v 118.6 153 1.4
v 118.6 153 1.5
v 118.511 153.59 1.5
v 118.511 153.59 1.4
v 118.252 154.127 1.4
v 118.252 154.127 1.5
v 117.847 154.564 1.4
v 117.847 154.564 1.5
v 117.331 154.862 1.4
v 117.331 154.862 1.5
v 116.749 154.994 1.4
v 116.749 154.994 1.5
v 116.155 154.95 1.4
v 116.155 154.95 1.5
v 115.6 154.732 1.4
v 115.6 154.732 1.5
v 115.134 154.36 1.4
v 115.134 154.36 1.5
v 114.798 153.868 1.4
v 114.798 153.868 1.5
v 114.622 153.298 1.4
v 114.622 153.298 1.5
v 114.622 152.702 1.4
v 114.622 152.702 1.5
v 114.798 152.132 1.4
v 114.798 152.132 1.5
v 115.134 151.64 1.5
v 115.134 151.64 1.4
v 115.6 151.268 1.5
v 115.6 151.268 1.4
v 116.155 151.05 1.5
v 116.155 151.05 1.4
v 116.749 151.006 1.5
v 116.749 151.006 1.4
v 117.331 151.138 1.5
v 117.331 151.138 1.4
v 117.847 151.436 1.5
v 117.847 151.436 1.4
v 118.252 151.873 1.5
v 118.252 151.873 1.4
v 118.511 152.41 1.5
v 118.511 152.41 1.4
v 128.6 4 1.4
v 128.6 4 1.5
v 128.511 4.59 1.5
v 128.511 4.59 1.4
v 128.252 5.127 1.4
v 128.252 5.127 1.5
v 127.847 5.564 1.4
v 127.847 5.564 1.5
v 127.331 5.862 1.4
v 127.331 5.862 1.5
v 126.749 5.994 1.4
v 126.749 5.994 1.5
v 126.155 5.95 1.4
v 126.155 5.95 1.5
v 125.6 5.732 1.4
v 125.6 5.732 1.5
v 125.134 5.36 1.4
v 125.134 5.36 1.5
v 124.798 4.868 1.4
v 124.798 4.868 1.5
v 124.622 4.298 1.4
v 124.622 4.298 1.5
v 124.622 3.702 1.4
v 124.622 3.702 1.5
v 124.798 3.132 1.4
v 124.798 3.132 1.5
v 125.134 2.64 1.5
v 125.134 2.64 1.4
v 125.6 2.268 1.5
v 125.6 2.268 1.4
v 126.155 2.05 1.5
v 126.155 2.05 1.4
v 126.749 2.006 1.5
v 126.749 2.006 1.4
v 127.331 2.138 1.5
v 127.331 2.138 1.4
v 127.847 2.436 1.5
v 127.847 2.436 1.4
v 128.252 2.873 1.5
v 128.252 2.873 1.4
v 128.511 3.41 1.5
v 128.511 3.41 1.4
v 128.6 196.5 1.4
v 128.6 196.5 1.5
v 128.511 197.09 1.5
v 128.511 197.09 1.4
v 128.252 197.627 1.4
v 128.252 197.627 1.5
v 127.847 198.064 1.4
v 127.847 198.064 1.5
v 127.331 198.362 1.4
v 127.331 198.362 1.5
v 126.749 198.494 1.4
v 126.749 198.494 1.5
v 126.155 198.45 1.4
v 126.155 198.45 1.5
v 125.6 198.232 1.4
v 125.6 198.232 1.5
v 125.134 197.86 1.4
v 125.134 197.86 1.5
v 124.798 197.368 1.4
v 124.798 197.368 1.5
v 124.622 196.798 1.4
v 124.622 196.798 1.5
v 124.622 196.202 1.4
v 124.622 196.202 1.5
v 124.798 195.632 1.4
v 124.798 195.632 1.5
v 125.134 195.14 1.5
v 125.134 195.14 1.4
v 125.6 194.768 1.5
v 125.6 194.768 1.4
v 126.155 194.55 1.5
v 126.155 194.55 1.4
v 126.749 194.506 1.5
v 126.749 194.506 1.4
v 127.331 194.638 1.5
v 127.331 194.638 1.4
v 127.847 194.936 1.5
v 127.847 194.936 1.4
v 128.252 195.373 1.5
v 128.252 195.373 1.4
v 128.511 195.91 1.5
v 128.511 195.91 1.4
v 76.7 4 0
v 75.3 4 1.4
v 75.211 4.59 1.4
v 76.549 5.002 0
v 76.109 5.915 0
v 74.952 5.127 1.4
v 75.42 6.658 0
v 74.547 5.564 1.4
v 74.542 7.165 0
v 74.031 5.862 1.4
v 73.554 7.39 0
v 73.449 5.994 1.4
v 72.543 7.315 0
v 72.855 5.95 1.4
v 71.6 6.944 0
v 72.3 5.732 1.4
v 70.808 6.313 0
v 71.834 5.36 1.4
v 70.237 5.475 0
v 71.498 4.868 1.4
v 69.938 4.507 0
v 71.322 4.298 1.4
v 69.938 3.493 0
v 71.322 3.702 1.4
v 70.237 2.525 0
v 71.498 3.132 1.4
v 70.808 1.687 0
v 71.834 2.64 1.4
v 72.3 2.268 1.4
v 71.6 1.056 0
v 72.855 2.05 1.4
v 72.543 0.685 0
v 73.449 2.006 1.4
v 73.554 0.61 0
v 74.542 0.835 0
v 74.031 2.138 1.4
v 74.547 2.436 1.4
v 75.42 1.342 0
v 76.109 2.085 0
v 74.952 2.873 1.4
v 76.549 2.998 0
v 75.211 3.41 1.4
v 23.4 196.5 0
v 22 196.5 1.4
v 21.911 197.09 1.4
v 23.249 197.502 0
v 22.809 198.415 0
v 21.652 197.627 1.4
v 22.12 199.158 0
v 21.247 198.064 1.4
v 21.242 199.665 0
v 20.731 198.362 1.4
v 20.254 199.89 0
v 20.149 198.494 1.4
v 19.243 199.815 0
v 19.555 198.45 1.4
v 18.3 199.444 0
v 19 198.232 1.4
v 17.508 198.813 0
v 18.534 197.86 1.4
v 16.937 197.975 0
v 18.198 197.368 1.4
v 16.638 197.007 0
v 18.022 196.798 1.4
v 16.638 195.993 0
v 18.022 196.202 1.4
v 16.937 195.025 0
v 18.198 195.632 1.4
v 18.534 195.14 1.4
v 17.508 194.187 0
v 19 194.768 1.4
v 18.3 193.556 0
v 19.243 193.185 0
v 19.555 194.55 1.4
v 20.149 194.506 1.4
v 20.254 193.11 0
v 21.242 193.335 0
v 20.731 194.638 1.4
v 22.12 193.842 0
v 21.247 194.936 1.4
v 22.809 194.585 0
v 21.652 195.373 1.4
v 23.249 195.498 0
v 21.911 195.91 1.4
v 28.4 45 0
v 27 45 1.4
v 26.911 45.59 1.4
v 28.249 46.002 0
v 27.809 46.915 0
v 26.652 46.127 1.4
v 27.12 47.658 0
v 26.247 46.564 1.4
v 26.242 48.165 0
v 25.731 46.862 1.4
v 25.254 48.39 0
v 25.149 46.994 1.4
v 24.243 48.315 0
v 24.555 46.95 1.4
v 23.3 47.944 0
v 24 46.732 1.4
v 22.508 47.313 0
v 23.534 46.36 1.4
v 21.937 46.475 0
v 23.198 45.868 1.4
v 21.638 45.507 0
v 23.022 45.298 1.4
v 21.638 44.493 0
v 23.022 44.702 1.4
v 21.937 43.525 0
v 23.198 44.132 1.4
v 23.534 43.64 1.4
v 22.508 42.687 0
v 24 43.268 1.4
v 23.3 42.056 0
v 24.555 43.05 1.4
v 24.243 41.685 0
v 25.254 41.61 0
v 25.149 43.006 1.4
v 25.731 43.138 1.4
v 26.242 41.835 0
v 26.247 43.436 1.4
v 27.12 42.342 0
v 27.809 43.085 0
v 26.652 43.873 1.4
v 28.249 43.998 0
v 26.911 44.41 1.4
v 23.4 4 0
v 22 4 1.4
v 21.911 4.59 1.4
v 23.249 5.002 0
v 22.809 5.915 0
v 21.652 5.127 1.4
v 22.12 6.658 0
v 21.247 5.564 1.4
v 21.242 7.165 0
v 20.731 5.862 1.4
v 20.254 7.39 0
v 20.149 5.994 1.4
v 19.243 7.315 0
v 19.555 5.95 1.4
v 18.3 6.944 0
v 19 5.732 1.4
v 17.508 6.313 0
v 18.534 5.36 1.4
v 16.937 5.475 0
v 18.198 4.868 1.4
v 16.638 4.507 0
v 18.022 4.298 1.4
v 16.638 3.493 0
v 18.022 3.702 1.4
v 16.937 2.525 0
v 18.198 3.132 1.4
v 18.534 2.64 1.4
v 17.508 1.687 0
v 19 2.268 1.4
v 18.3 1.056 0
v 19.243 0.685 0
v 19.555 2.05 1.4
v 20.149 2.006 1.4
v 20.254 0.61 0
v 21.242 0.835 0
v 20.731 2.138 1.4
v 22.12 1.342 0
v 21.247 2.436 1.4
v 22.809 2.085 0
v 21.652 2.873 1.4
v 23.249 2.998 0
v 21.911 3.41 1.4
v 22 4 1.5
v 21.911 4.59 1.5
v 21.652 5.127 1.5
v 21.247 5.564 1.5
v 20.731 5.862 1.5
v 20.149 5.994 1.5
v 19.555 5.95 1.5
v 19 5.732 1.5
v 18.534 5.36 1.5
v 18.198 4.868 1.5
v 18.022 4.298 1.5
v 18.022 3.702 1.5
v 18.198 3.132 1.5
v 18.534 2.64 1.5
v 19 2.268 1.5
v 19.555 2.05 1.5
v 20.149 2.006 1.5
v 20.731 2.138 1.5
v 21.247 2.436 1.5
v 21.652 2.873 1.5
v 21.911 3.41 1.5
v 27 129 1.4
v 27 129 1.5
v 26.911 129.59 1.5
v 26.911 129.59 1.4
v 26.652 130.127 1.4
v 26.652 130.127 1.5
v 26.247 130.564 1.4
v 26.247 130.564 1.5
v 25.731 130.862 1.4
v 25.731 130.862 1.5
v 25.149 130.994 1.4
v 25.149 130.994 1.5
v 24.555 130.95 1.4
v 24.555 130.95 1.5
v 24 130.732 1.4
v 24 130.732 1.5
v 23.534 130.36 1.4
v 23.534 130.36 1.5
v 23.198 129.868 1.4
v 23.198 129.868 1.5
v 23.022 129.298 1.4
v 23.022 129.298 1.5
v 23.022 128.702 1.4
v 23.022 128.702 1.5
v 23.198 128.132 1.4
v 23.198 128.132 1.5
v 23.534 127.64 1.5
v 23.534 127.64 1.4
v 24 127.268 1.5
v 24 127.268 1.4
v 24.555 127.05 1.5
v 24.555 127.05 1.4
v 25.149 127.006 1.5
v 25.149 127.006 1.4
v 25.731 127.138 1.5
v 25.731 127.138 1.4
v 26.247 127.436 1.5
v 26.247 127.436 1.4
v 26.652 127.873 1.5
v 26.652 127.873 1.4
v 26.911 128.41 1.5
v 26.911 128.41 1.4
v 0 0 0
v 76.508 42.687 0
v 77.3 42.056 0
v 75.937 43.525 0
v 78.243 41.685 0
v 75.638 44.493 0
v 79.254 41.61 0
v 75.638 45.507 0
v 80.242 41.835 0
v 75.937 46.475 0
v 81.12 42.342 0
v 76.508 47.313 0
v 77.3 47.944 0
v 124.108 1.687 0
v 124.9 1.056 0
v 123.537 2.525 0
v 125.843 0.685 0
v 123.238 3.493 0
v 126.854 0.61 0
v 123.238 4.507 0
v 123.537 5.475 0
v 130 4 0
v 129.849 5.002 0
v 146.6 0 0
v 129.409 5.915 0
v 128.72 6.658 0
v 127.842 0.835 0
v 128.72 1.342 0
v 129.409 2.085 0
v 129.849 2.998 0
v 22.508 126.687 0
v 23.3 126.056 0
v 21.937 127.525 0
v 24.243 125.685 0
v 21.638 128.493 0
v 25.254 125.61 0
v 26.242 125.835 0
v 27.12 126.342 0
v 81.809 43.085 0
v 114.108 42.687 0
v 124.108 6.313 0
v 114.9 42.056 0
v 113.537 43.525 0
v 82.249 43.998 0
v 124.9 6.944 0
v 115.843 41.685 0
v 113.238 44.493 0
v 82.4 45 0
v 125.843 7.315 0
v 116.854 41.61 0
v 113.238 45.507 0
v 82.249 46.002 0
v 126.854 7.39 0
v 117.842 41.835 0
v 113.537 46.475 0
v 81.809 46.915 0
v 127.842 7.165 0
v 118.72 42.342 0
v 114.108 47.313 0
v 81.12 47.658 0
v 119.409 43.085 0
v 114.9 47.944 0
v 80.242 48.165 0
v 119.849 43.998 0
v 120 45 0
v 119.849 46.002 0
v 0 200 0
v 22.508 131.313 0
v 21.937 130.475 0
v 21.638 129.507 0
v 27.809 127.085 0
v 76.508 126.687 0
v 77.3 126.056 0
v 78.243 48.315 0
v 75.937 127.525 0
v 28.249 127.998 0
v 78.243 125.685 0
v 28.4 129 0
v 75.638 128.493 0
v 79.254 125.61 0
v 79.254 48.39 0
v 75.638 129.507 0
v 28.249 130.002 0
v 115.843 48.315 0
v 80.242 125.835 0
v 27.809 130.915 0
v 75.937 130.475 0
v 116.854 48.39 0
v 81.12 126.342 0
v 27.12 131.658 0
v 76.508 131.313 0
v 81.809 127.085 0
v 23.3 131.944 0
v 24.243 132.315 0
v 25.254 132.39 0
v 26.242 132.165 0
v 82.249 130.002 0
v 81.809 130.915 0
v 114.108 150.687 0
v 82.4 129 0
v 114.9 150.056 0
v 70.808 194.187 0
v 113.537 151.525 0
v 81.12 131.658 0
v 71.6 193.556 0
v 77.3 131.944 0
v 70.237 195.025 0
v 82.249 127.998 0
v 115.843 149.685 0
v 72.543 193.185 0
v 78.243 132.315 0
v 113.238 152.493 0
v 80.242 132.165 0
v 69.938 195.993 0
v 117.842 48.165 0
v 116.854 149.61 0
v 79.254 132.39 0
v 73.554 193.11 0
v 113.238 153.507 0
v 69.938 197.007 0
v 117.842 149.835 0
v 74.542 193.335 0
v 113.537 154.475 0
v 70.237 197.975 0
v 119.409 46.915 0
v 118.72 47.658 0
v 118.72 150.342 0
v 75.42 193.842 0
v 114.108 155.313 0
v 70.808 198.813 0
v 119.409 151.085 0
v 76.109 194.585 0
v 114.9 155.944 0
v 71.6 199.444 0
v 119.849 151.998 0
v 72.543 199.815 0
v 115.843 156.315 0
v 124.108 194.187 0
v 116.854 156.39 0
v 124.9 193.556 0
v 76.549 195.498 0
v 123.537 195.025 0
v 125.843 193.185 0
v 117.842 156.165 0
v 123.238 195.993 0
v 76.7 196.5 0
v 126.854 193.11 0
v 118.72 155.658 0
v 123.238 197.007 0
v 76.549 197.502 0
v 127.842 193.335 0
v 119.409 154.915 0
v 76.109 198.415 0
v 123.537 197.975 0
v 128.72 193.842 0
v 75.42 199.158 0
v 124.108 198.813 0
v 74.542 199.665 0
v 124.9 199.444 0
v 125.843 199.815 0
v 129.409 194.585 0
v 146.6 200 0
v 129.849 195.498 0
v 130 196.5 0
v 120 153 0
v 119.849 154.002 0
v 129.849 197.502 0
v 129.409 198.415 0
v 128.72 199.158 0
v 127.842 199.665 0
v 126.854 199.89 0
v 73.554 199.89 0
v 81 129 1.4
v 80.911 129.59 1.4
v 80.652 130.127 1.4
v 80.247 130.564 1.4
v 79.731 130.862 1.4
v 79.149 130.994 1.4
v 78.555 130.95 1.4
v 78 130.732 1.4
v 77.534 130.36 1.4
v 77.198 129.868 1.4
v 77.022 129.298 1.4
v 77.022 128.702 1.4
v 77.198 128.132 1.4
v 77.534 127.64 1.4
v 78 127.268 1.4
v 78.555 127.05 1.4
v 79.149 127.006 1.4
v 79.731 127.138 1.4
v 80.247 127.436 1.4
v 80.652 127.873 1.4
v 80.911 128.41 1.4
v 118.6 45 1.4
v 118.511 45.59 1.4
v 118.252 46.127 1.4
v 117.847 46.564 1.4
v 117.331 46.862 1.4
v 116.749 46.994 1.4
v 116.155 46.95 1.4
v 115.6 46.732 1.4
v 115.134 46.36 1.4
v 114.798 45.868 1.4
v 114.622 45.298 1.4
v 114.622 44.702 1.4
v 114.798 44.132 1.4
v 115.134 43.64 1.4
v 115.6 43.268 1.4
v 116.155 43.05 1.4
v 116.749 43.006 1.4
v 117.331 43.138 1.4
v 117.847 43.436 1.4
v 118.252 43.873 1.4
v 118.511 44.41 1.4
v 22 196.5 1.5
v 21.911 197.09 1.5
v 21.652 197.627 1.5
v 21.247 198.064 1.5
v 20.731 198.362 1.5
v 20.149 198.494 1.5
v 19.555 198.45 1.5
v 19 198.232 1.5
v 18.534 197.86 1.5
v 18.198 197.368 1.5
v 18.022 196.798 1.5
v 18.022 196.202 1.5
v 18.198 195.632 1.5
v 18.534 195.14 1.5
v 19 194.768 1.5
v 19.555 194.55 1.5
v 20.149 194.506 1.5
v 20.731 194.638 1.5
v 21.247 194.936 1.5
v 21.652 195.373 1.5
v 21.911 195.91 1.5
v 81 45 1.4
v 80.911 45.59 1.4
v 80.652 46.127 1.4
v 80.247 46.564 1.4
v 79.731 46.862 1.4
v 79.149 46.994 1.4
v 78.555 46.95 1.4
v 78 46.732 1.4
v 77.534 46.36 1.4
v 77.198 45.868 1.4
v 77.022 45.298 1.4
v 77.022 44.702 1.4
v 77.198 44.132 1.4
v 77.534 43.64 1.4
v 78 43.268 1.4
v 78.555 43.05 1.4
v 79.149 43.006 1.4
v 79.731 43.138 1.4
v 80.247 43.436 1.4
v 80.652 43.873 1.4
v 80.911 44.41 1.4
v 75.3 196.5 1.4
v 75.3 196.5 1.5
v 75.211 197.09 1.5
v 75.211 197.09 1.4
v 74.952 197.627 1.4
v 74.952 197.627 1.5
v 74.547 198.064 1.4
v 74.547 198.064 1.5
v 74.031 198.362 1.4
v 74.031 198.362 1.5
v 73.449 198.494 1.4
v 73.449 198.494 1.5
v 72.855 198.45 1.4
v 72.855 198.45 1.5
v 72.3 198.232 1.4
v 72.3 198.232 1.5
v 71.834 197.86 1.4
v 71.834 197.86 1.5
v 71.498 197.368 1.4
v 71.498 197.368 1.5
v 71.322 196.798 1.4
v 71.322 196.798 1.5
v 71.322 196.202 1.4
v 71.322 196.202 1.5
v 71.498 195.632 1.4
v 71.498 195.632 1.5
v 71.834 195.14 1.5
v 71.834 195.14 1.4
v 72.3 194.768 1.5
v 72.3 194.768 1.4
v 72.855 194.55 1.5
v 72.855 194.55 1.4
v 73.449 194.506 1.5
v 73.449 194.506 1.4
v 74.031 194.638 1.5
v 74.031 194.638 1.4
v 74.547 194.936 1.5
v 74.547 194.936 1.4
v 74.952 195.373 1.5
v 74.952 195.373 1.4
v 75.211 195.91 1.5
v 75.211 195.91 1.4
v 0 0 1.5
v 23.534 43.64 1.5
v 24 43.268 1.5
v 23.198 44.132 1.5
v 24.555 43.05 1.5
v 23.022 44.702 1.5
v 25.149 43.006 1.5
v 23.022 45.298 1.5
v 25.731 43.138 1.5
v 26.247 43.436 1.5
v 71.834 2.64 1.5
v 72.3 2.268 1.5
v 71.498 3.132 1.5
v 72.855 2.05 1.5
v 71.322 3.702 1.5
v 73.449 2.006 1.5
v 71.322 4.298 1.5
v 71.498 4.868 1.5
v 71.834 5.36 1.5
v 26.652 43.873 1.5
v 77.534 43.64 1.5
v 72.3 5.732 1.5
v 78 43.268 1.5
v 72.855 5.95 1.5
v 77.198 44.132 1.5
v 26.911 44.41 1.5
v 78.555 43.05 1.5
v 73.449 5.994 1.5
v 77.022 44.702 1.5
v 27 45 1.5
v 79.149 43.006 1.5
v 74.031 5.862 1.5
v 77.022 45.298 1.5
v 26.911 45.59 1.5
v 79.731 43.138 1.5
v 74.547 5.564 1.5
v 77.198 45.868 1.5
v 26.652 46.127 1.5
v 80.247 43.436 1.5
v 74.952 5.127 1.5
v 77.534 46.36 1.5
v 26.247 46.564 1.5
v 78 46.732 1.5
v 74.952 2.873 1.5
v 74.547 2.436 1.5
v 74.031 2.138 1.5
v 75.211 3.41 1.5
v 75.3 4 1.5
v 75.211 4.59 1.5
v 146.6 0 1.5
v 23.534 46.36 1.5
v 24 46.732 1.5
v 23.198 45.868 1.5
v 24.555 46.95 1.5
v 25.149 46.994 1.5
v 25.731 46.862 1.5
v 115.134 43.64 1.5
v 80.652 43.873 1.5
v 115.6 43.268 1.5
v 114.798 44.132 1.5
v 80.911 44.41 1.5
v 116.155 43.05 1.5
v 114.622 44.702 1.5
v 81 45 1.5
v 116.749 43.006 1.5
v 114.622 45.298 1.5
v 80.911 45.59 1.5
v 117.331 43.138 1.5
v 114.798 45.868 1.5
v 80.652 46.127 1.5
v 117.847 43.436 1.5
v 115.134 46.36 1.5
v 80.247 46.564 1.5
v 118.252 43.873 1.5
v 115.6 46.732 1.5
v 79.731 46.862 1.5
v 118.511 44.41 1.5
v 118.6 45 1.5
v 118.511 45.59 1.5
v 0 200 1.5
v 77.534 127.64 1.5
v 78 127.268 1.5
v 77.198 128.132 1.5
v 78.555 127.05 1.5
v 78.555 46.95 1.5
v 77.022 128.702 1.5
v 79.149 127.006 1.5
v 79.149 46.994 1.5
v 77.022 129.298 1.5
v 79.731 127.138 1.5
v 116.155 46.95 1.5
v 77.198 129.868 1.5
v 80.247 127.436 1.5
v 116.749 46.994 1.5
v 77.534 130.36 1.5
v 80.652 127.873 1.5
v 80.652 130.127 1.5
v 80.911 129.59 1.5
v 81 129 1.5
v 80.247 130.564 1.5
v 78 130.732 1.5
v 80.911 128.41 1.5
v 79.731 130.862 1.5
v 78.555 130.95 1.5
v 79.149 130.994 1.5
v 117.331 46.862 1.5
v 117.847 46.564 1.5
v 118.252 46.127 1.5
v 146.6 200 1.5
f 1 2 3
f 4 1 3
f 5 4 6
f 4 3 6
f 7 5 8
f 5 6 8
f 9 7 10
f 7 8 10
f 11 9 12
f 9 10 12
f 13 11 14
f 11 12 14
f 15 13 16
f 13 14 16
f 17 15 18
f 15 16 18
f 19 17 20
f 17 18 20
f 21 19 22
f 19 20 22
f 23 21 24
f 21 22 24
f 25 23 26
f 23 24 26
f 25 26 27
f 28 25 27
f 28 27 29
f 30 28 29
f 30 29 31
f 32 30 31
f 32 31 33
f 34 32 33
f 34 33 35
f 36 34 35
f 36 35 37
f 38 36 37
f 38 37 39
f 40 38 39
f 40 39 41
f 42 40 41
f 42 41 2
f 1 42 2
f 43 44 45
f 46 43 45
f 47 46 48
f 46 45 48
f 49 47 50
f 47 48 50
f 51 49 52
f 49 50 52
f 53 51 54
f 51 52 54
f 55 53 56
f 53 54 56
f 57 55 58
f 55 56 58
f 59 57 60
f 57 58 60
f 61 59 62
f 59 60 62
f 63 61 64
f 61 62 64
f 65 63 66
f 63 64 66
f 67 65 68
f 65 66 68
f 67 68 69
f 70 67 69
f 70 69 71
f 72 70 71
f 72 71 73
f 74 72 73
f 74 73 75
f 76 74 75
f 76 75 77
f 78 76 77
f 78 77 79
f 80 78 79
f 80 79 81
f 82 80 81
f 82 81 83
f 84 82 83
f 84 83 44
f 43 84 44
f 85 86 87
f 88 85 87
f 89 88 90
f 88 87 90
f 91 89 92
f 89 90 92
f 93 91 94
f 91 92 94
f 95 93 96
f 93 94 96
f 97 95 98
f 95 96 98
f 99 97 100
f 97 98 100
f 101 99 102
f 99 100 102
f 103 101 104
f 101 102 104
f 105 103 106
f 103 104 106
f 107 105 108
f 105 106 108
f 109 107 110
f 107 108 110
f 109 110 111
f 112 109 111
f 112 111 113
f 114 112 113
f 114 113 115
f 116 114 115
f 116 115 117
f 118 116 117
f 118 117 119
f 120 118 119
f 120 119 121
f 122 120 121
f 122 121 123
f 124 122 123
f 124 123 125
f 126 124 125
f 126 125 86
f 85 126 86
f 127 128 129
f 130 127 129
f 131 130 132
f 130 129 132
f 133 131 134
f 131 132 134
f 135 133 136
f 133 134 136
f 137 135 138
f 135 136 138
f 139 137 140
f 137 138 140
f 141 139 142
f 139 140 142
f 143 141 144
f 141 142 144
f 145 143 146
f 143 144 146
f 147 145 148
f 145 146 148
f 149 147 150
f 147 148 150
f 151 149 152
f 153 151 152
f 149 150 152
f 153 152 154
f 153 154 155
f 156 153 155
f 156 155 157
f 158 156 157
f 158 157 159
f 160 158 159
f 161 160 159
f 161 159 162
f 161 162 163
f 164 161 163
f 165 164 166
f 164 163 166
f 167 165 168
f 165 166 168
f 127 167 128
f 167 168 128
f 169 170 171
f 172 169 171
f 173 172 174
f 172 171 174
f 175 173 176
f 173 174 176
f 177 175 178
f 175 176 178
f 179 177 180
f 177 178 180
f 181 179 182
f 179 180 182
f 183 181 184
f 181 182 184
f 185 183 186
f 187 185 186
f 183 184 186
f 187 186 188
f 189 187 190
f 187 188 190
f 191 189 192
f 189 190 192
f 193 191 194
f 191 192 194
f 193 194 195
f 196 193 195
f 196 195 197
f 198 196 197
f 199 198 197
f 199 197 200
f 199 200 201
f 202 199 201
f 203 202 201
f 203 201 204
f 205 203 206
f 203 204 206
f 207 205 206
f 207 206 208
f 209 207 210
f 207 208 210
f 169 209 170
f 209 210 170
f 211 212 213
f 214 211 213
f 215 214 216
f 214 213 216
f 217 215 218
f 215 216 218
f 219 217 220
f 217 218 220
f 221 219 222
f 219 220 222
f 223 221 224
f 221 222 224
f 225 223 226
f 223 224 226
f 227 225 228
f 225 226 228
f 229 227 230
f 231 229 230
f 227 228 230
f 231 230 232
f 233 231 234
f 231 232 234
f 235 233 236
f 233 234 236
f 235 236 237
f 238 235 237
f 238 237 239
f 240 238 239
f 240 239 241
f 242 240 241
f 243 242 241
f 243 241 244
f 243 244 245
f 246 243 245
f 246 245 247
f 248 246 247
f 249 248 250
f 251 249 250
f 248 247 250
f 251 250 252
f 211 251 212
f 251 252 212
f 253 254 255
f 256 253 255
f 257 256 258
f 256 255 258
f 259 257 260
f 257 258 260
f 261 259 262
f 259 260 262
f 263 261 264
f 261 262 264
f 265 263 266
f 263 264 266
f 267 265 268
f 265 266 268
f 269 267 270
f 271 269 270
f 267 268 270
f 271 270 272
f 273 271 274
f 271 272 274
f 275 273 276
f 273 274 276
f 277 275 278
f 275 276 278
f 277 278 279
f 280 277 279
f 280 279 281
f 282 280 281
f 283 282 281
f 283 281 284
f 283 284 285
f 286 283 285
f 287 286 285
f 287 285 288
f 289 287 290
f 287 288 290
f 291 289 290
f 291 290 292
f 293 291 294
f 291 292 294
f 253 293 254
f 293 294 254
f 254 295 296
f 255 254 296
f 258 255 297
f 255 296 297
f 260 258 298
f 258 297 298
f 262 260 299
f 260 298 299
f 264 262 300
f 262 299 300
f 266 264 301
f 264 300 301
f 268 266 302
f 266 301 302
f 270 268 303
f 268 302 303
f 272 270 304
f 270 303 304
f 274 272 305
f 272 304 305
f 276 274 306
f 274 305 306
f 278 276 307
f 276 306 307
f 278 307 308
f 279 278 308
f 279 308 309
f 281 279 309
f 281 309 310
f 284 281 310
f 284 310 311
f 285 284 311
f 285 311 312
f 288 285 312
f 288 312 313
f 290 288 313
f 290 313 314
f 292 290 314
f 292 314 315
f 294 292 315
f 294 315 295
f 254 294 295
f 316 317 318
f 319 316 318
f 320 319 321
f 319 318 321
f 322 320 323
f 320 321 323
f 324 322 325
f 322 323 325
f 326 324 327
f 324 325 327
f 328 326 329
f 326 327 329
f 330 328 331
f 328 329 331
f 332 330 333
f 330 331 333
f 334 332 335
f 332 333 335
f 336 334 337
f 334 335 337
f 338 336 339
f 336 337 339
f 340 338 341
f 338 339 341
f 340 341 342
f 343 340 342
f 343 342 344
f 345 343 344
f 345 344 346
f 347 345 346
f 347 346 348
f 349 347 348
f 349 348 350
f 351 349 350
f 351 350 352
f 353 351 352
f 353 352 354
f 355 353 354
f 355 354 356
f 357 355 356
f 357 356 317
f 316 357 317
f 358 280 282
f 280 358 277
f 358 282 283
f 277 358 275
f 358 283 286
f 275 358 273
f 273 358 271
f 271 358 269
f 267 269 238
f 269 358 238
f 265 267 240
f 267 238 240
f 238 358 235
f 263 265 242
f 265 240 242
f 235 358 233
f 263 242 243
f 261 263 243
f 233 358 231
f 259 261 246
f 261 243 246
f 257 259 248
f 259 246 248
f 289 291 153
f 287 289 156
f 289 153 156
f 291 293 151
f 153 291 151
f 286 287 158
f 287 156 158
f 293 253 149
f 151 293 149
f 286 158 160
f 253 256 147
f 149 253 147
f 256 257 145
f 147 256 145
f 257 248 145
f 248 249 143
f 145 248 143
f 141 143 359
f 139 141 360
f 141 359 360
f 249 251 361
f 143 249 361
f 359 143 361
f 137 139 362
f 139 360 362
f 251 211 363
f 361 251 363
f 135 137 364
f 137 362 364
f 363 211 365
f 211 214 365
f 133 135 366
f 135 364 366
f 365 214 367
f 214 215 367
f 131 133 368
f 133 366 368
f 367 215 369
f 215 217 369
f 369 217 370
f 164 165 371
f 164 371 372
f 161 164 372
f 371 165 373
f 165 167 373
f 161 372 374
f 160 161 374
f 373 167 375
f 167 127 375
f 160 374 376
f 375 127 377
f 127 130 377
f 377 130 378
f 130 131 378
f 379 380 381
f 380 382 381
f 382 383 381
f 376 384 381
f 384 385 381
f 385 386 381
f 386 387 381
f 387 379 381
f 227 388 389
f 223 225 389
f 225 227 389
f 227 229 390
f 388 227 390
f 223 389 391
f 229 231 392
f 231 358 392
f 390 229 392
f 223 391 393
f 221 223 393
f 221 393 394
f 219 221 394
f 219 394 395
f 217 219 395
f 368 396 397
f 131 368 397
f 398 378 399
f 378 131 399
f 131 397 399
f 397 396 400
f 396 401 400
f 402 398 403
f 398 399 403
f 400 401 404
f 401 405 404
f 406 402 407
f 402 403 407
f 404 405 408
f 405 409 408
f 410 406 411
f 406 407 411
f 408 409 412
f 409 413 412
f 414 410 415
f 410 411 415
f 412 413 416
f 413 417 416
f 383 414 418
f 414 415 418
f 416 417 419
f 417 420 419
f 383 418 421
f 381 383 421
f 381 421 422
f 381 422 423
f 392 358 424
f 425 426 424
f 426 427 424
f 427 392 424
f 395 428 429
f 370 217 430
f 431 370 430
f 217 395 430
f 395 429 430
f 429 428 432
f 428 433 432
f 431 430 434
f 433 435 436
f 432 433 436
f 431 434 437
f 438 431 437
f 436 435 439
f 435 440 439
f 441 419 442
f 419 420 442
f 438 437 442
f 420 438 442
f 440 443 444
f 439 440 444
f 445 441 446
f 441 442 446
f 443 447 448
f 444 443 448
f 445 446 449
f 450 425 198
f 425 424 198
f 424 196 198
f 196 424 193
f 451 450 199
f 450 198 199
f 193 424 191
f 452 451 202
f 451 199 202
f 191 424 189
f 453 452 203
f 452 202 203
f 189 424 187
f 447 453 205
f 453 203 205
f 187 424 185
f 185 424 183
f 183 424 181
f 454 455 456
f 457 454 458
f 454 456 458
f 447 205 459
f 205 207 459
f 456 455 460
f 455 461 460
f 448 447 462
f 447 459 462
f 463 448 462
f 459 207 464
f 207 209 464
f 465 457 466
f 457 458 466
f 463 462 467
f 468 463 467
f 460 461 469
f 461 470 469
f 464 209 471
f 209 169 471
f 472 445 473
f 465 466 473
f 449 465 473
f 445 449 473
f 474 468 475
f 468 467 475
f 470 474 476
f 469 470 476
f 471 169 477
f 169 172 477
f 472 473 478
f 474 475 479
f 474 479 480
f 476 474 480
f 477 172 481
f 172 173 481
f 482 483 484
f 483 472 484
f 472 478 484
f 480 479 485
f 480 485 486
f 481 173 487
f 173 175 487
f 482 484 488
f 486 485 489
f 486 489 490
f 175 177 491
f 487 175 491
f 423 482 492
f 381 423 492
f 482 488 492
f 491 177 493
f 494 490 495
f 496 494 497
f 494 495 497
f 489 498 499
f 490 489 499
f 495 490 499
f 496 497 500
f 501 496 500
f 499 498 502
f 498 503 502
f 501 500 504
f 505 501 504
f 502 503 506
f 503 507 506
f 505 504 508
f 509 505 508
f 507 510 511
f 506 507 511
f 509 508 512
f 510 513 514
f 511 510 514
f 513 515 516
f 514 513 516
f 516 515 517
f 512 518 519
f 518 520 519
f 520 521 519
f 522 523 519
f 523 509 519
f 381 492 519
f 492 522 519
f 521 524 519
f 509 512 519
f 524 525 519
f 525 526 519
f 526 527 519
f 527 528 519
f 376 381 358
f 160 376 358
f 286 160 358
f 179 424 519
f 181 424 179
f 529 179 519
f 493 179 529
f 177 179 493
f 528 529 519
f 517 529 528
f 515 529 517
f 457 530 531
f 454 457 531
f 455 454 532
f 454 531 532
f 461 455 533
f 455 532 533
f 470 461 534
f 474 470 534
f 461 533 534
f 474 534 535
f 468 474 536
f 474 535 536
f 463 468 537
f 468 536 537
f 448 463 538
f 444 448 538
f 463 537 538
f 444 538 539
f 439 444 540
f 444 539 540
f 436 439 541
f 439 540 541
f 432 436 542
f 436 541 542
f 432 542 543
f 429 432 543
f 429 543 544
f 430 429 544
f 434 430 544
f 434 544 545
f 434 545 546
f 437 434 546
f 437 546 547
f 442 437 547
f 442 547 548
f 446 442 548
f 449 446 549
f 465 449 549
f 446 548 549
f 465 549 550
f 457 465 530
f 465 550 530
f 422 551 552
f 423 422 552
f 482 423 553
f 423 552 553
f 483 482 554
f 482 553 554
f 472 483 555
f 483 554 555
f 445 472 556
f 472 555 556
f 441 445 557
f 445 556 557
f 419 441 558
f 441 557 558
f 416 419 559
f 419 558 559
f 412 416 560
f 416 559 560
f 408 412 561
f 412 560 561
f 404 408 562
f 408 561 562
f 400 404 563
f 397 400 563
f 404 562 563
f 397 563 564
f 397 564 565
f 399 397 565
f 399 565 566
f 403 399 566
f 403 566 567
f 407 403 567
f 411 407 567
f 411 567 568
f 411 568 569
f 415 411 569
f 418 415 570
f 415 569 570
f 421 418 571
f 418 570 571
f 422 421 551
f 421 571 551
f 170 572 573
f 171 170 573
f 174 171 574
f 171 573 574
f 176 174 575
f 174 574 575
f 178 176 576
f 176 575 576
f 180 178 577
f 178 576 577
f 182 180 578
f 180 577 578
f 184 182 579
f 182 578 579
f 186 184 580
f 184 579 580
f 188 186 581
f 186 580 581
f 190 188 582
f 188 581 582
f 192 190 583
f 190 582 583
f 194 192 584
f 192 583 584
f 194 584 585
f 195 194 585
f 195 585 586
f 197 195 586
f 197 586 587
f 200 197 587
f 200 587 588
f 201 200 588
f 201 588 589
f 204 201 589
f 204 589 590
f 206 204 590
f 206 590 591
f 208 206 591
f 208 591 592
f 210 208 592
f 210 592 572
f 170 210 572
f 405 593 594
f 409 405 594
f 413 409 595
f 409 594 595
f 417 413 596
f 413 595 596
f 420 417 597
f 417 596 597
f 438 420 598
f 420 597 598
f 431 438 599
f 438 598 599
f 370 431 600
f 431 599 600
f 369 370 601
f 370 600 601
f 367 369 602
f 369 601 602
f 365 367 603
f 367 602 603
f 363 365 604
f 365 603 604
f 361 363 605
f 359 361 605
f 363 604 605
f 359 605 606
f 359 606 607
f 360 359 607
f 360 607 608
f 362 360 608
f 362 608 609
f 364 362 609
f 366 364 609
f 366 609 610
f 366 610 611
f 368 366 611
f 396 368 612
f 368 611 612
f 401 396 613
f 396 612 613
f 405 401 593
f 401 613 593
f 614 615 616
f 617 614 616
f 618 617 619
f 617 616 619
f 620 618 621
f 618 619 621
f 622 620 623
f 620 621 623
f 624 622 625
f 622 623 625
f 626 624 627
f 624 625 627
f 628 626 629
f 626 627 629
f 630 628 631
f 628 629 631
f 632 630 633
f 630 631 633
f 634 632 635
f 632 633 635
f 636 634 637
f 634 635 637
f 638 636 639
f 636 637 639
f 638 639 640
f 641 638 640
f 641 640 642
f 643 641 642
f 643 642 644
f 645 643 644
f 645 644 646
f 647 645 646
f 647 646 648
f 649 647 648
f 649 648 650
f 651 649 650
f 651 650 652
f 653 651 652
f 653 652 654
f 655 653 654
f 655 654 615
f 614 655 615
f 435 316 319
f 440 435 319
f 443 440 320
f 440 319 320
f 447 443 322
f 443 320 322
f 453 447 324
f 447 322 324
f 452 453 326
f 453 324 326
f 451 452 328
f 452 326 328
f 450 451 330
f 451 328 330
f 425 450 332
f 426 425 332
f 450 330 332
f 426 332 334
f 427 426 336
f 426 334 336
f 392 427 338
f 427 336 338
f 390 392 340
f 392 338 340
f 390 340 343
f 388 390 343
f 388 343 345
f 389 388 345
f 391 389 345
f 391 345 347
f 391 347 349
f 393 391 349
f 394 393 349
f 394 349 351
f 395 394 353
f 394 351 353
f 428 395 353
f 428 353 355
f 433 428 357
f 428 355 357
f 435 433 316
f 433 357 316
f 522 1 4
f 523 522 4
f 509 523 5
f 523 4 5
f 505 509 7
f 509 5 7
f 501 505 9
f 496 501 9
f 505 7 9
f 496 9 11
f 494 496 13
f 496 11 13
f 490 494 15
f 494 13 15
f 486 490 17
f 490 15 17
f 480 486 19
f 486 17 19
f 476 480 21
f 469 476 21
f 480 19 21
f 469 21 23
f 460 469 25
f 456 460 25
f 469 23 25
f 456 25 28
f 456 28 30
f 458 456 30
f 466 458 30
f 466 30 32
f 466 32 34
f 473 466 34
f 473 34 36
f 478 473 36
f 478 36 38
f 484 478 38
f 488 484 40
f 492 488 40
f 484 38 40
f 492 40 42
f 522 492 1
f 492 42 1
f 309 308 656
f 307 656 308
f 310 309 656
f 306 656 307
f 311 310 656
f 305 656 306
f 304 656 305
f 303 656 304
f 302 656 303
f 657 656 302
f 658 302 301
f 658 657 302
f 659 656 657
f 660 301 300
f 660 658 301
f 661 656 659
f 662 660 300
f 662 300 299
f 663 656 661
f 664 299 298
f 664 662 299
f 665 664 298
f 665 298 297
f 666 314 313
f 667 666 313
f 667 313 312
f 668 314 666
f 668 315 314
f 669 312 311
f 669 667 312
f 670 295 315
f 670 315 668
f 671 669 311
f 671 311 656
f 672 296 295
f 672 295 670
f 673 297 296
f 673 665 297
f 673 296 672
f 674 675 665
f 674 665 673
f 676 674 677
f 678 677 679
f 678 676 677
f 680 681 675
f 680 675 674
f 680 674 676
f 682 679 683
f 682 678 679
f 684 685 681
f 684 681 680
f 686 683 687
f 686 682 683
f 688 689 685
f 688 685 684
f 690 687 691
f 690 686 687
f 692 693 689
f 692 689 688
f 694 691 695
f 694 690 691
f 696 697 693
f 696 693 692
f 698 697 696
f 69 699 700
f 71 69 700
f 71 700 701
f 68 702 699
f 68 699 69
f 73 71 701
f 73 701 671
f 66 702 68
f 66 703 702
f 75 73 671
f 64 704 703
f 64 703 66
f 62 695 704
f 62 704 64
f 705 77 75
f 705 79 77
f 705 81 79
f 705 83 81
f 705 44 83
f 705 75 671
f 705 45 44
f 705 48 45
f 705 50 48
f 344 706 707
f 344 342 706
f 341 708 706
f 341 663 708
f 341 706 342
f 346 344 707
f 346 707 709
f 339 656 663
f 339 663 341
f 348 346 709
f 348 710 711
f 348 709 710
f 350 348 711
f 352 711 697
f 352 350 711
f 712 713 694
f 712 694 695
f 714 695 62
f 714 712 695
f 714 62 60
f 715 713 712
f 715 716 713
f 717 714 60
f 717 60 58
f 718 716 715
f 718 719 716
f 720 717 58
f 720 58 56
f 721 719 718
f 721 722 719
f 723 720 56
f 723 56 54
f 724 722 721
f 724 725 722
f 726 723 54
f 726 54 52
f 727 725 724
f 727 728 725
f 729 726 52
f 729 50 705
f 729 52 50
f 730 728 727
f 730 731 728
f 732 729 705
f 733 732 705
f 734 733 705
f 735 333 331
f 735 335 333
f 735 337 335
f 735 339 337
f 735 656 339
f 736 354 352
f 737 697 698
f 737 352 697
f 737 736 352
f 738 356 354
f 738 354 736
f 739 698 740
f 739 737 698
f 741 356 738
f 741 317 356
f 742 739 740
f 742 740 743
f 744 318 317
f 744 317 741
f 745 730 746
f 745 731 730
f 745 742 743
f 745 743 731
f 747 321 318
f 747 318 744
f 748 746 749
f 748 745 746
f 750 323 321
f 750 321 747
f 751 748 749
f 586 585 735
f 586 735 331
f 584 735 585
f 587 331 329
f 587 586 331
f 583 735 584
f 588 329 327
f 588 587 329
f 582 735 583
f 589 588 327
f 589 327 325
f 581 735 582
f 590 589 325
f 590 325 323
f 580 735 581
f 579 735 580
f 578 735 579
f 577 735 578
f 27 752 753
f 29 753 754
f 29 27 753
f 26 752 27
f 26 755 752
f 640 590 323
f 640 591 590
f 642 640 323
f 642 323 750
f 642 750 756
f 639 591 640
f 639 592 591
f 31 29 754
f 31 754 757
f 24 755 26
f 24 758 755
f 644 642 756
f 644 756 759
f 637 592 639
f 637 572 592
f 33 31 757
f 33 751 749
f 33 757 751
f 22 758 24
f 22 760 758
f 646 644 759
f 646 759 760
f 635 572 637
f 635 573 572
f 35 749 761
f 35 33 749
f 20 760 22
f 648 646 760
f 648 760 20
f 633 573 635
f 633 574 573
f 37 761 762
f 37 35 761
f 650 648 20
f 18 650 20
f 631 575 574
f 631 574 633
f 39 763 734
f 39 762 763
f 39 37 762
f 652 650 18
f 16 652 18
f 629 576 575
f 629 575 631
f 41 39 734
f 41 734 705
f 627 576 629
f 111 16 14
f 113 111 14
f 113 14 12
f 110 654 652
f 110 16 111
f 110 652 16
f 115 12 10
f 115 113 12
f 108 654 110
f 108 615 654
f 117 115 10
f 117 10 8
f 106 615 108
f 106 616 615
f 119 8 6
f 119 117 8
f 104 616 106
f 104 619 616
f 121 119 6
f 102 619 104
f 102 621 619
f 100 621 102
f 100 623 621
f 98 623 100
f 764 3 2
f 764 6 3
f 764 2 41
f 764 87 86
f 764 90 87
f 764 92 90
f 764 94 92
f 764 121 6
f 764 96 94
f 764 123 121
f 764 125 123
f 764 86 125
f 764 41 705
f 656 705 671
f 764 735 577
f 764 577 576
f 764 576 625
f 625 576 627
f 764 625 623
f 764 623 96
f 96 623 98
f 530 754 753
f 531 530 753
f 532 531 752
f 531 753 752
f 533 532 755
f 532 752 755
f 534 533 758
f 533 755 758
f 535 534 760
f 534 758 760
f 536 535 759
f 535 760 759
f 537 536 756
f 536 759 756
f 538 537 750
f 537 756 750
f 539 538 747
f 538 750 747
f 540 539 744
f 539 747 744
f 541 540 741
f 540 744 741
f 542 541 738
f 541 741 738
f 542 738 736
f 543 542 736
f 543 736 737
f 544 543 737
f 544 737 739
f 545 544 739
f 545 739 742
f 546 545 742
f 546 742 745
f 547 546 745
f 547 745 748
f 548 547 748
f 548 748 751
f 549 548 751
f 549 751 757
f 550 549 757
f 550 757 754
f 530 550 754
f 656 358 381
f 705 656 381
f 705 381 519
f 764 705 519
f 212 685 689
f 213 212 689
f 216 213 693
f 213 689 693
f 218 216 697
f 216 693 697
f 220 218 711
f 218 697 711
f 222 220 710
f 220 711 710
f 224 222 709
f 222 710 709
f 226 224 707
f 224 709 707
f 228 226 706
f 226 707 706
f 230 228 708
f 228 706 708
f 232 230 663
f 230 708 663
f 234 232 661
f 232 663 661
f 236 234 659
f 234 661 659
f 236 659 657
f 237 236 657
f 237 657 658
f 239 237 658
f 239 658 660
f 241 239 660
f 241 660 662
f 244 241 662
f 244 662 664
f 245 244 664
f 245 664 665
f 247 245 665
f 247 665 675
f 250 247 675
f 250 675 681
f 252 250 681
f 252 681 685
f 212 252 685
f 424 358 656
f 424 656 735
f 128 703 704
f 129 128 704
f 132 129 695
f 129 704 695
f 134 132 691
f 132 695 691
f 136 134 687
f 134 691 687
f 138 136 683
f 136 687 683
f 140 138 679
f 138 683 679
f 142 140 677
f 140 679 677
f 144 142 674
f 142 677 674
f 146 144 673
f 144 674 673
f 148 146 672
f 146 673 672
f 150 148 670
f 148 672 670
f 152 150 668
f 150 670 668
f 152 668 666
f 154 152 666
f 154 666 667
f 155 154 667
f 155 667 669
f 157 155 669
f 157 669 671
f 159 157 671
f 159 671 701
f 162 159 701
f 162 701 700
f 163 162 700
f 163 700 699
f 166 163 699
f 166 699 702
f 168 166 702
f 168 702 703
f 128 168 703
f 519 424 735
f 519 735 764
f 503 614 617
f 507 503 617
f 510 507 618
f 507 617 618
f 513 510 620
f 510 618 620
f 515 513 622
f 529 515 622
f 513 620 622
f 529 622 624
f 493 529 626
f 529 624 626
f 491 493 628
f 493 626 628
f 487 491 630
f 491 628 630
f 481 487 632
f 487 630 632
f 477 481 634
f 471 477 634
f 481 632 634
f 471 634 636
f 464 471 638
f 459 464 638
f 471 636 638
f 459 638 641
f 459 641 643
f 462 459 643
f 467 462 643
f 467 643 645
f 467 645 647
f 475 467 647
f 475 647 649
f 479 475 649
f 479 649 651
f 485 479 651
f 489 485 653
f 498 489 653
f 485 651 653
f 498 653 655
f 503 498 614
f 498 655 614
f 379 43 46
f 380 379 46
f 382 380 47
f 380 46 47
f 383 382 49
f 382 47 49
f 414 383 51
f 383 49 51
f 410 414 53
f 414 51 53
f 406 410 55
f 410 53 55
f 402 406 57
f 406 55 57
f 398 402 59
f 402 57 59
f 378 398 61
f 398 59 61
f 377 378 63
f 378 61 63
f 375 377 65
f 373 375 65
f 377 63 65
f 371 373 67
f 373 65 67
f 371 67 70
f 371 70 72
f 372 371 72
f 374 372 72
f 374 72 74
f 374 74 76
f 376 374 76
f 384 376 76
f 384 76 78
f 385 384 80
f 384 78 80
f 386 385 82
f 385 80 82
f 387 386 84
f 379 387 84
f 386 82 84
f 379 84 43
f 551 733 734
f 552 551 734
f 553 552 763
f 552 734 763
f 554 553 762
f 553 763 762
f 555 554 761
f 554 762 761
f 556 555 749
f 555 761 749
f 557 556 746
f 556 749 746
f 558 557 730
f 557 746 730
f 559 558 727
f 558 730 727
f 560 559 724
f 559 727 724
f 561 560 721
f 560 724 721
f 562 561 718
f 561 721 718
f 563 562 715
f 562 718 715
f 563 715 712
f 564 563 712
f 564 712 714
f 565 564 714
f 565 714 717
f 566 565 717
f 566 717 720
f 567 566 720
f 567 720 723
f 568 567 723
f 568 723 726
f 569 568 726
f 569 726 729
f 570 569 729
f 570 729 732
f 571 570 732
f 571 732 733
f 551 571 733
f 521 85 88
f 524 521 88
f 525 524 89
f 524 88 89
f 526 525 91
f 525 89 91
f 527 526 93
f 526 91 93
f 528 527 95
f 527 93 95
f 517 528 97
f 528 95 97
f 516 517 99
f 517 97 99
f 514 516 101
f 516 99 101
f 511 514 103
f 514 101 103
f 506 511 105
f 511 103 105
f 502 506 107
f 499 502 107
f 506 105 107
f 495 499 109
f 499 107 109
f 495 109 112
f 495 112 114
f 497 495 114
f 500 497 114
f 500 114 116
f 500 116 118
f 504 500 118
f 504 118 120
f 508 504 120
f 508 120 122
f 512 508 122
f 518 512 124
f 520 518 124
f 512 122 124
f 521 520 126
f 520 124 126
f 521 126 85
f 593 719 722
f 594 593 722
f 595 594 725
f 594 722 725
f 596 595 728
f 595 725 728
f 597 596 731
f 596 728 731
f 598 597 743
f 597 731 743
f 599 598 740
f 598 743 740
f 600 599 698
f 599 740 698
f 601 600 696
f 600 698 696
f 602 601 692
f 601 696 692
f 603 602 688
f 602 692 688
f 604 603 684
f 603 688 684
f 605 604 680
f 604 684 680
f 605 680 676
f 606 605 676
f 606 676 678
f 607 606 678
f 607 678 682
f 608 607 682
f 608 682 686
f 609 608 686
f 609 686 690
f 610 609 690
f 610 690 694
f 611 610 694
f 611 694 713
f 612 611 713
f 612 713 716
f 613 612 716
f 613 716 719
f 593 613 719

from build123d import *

# Parameters (mm, degrees)
SKETCH_1_W          = 146.6
SKETCH_1_H          = 200
EXTRUDE_1_DEPTH     = 1.5
SKETCH_2_R          = 2
CUT_EXTRUDE_1_DEPTH = 248.979454794
SKETCH_3_R          = 2
CUT_EXTRUDE_2_DEPTH = 248.979454794
SKETCH_4_R          = 2
CUT_EXTRUDE_3_DEPTH = 248.979454794
CHAMFER_1_SIZE      = 1.4


with BuildPart() as part:
    # Эскиз1 → Бобышка-Вытянуть1 (new body)
    with BuildSketch(Plane.XY):
        with Locations((73.3, 100)):
            Rectangle(SKETCH_1_W, SKETCH_1_H)
    extrude(amount=EXTRUDE_1_DEPTH)

    # Эскиз2 → Вырез-Вытянуть1 (cut, through all)
    with BuildSketch(Plane.XY.offset(1.5)):
        with Locations((20, 4)):
            Circle(SKETCH_2_R)
        with Locations((20, 196.5)):
            Circle(SKETCH_2_R)
        with Locations((73.3, 196.5)):
            Circle(SKETCH_2_R)
        with Locations((73.3, 4)):
            Circle(SKETCH_2_R)
        with Locations((126.6, 196.5)):
            Circle(SKETCH_2_R)
        with Locations((126.6, 4)):
            Circle(SKETCH_2_R)
    extrude(amount=-CUT_EXTRUDE_1_DEPTH, mode=Mode.SUBTRACT)

    # Эскиз3 → Вырез-Вытянуть2 (cut, through all)
    with BuildSketch(Plane.XY.offset(1.5)):
        with Locations((25, 45)):
            Circle(SKETCH_3_R)
        with Locations((79, 45)):
            Circle(SKETCH_3_R)
        with Locations((79, 129)):
            Circle(SKETCH_3_R)
        with Locations((25, 129)):
            Circle(SKETCH_3_R)
    extrude(amount=-CUT_EXTRUDE_2_DEPTH, mode=Mode.SUBTRACT)

    # Эскиз4 → Вырез-Вытянуть3 (cut, through all)
    with BuildSketch(Plane.XY.offset(1.5)):
        with Locations((116.6, 45)):
            Circle(SKETCH_4_R)
        with Locations((116.6, 153)):
            Circle(SKETCH_4_R)
    extrude(amount=-CUT_EXTRUDE_3_DEPTH, mode=Mode.SUBTRACT)

    # Фаска1
    chamfer_1_edges = [part.edges().sort_by_distance(p)[0] for p in [
        (124.6, 4, 0),
        (71.3, 196.5, 0),
        (71.3, 4, 0),
        (18, 196.5, 0),
        (124.6, 196.5, 0),
        (18, 4, 0),
        (23, 129, 0),
        (77, 129, 0),
        (77, 45, 0),
        (23, 45, 0),
        (114.6, 45, 0),
        (114.6, 153, 0),
    ]]
    chamfer(chamfer_1_edges, length=CHAMFER_1_SIZE)


solid = part.part
